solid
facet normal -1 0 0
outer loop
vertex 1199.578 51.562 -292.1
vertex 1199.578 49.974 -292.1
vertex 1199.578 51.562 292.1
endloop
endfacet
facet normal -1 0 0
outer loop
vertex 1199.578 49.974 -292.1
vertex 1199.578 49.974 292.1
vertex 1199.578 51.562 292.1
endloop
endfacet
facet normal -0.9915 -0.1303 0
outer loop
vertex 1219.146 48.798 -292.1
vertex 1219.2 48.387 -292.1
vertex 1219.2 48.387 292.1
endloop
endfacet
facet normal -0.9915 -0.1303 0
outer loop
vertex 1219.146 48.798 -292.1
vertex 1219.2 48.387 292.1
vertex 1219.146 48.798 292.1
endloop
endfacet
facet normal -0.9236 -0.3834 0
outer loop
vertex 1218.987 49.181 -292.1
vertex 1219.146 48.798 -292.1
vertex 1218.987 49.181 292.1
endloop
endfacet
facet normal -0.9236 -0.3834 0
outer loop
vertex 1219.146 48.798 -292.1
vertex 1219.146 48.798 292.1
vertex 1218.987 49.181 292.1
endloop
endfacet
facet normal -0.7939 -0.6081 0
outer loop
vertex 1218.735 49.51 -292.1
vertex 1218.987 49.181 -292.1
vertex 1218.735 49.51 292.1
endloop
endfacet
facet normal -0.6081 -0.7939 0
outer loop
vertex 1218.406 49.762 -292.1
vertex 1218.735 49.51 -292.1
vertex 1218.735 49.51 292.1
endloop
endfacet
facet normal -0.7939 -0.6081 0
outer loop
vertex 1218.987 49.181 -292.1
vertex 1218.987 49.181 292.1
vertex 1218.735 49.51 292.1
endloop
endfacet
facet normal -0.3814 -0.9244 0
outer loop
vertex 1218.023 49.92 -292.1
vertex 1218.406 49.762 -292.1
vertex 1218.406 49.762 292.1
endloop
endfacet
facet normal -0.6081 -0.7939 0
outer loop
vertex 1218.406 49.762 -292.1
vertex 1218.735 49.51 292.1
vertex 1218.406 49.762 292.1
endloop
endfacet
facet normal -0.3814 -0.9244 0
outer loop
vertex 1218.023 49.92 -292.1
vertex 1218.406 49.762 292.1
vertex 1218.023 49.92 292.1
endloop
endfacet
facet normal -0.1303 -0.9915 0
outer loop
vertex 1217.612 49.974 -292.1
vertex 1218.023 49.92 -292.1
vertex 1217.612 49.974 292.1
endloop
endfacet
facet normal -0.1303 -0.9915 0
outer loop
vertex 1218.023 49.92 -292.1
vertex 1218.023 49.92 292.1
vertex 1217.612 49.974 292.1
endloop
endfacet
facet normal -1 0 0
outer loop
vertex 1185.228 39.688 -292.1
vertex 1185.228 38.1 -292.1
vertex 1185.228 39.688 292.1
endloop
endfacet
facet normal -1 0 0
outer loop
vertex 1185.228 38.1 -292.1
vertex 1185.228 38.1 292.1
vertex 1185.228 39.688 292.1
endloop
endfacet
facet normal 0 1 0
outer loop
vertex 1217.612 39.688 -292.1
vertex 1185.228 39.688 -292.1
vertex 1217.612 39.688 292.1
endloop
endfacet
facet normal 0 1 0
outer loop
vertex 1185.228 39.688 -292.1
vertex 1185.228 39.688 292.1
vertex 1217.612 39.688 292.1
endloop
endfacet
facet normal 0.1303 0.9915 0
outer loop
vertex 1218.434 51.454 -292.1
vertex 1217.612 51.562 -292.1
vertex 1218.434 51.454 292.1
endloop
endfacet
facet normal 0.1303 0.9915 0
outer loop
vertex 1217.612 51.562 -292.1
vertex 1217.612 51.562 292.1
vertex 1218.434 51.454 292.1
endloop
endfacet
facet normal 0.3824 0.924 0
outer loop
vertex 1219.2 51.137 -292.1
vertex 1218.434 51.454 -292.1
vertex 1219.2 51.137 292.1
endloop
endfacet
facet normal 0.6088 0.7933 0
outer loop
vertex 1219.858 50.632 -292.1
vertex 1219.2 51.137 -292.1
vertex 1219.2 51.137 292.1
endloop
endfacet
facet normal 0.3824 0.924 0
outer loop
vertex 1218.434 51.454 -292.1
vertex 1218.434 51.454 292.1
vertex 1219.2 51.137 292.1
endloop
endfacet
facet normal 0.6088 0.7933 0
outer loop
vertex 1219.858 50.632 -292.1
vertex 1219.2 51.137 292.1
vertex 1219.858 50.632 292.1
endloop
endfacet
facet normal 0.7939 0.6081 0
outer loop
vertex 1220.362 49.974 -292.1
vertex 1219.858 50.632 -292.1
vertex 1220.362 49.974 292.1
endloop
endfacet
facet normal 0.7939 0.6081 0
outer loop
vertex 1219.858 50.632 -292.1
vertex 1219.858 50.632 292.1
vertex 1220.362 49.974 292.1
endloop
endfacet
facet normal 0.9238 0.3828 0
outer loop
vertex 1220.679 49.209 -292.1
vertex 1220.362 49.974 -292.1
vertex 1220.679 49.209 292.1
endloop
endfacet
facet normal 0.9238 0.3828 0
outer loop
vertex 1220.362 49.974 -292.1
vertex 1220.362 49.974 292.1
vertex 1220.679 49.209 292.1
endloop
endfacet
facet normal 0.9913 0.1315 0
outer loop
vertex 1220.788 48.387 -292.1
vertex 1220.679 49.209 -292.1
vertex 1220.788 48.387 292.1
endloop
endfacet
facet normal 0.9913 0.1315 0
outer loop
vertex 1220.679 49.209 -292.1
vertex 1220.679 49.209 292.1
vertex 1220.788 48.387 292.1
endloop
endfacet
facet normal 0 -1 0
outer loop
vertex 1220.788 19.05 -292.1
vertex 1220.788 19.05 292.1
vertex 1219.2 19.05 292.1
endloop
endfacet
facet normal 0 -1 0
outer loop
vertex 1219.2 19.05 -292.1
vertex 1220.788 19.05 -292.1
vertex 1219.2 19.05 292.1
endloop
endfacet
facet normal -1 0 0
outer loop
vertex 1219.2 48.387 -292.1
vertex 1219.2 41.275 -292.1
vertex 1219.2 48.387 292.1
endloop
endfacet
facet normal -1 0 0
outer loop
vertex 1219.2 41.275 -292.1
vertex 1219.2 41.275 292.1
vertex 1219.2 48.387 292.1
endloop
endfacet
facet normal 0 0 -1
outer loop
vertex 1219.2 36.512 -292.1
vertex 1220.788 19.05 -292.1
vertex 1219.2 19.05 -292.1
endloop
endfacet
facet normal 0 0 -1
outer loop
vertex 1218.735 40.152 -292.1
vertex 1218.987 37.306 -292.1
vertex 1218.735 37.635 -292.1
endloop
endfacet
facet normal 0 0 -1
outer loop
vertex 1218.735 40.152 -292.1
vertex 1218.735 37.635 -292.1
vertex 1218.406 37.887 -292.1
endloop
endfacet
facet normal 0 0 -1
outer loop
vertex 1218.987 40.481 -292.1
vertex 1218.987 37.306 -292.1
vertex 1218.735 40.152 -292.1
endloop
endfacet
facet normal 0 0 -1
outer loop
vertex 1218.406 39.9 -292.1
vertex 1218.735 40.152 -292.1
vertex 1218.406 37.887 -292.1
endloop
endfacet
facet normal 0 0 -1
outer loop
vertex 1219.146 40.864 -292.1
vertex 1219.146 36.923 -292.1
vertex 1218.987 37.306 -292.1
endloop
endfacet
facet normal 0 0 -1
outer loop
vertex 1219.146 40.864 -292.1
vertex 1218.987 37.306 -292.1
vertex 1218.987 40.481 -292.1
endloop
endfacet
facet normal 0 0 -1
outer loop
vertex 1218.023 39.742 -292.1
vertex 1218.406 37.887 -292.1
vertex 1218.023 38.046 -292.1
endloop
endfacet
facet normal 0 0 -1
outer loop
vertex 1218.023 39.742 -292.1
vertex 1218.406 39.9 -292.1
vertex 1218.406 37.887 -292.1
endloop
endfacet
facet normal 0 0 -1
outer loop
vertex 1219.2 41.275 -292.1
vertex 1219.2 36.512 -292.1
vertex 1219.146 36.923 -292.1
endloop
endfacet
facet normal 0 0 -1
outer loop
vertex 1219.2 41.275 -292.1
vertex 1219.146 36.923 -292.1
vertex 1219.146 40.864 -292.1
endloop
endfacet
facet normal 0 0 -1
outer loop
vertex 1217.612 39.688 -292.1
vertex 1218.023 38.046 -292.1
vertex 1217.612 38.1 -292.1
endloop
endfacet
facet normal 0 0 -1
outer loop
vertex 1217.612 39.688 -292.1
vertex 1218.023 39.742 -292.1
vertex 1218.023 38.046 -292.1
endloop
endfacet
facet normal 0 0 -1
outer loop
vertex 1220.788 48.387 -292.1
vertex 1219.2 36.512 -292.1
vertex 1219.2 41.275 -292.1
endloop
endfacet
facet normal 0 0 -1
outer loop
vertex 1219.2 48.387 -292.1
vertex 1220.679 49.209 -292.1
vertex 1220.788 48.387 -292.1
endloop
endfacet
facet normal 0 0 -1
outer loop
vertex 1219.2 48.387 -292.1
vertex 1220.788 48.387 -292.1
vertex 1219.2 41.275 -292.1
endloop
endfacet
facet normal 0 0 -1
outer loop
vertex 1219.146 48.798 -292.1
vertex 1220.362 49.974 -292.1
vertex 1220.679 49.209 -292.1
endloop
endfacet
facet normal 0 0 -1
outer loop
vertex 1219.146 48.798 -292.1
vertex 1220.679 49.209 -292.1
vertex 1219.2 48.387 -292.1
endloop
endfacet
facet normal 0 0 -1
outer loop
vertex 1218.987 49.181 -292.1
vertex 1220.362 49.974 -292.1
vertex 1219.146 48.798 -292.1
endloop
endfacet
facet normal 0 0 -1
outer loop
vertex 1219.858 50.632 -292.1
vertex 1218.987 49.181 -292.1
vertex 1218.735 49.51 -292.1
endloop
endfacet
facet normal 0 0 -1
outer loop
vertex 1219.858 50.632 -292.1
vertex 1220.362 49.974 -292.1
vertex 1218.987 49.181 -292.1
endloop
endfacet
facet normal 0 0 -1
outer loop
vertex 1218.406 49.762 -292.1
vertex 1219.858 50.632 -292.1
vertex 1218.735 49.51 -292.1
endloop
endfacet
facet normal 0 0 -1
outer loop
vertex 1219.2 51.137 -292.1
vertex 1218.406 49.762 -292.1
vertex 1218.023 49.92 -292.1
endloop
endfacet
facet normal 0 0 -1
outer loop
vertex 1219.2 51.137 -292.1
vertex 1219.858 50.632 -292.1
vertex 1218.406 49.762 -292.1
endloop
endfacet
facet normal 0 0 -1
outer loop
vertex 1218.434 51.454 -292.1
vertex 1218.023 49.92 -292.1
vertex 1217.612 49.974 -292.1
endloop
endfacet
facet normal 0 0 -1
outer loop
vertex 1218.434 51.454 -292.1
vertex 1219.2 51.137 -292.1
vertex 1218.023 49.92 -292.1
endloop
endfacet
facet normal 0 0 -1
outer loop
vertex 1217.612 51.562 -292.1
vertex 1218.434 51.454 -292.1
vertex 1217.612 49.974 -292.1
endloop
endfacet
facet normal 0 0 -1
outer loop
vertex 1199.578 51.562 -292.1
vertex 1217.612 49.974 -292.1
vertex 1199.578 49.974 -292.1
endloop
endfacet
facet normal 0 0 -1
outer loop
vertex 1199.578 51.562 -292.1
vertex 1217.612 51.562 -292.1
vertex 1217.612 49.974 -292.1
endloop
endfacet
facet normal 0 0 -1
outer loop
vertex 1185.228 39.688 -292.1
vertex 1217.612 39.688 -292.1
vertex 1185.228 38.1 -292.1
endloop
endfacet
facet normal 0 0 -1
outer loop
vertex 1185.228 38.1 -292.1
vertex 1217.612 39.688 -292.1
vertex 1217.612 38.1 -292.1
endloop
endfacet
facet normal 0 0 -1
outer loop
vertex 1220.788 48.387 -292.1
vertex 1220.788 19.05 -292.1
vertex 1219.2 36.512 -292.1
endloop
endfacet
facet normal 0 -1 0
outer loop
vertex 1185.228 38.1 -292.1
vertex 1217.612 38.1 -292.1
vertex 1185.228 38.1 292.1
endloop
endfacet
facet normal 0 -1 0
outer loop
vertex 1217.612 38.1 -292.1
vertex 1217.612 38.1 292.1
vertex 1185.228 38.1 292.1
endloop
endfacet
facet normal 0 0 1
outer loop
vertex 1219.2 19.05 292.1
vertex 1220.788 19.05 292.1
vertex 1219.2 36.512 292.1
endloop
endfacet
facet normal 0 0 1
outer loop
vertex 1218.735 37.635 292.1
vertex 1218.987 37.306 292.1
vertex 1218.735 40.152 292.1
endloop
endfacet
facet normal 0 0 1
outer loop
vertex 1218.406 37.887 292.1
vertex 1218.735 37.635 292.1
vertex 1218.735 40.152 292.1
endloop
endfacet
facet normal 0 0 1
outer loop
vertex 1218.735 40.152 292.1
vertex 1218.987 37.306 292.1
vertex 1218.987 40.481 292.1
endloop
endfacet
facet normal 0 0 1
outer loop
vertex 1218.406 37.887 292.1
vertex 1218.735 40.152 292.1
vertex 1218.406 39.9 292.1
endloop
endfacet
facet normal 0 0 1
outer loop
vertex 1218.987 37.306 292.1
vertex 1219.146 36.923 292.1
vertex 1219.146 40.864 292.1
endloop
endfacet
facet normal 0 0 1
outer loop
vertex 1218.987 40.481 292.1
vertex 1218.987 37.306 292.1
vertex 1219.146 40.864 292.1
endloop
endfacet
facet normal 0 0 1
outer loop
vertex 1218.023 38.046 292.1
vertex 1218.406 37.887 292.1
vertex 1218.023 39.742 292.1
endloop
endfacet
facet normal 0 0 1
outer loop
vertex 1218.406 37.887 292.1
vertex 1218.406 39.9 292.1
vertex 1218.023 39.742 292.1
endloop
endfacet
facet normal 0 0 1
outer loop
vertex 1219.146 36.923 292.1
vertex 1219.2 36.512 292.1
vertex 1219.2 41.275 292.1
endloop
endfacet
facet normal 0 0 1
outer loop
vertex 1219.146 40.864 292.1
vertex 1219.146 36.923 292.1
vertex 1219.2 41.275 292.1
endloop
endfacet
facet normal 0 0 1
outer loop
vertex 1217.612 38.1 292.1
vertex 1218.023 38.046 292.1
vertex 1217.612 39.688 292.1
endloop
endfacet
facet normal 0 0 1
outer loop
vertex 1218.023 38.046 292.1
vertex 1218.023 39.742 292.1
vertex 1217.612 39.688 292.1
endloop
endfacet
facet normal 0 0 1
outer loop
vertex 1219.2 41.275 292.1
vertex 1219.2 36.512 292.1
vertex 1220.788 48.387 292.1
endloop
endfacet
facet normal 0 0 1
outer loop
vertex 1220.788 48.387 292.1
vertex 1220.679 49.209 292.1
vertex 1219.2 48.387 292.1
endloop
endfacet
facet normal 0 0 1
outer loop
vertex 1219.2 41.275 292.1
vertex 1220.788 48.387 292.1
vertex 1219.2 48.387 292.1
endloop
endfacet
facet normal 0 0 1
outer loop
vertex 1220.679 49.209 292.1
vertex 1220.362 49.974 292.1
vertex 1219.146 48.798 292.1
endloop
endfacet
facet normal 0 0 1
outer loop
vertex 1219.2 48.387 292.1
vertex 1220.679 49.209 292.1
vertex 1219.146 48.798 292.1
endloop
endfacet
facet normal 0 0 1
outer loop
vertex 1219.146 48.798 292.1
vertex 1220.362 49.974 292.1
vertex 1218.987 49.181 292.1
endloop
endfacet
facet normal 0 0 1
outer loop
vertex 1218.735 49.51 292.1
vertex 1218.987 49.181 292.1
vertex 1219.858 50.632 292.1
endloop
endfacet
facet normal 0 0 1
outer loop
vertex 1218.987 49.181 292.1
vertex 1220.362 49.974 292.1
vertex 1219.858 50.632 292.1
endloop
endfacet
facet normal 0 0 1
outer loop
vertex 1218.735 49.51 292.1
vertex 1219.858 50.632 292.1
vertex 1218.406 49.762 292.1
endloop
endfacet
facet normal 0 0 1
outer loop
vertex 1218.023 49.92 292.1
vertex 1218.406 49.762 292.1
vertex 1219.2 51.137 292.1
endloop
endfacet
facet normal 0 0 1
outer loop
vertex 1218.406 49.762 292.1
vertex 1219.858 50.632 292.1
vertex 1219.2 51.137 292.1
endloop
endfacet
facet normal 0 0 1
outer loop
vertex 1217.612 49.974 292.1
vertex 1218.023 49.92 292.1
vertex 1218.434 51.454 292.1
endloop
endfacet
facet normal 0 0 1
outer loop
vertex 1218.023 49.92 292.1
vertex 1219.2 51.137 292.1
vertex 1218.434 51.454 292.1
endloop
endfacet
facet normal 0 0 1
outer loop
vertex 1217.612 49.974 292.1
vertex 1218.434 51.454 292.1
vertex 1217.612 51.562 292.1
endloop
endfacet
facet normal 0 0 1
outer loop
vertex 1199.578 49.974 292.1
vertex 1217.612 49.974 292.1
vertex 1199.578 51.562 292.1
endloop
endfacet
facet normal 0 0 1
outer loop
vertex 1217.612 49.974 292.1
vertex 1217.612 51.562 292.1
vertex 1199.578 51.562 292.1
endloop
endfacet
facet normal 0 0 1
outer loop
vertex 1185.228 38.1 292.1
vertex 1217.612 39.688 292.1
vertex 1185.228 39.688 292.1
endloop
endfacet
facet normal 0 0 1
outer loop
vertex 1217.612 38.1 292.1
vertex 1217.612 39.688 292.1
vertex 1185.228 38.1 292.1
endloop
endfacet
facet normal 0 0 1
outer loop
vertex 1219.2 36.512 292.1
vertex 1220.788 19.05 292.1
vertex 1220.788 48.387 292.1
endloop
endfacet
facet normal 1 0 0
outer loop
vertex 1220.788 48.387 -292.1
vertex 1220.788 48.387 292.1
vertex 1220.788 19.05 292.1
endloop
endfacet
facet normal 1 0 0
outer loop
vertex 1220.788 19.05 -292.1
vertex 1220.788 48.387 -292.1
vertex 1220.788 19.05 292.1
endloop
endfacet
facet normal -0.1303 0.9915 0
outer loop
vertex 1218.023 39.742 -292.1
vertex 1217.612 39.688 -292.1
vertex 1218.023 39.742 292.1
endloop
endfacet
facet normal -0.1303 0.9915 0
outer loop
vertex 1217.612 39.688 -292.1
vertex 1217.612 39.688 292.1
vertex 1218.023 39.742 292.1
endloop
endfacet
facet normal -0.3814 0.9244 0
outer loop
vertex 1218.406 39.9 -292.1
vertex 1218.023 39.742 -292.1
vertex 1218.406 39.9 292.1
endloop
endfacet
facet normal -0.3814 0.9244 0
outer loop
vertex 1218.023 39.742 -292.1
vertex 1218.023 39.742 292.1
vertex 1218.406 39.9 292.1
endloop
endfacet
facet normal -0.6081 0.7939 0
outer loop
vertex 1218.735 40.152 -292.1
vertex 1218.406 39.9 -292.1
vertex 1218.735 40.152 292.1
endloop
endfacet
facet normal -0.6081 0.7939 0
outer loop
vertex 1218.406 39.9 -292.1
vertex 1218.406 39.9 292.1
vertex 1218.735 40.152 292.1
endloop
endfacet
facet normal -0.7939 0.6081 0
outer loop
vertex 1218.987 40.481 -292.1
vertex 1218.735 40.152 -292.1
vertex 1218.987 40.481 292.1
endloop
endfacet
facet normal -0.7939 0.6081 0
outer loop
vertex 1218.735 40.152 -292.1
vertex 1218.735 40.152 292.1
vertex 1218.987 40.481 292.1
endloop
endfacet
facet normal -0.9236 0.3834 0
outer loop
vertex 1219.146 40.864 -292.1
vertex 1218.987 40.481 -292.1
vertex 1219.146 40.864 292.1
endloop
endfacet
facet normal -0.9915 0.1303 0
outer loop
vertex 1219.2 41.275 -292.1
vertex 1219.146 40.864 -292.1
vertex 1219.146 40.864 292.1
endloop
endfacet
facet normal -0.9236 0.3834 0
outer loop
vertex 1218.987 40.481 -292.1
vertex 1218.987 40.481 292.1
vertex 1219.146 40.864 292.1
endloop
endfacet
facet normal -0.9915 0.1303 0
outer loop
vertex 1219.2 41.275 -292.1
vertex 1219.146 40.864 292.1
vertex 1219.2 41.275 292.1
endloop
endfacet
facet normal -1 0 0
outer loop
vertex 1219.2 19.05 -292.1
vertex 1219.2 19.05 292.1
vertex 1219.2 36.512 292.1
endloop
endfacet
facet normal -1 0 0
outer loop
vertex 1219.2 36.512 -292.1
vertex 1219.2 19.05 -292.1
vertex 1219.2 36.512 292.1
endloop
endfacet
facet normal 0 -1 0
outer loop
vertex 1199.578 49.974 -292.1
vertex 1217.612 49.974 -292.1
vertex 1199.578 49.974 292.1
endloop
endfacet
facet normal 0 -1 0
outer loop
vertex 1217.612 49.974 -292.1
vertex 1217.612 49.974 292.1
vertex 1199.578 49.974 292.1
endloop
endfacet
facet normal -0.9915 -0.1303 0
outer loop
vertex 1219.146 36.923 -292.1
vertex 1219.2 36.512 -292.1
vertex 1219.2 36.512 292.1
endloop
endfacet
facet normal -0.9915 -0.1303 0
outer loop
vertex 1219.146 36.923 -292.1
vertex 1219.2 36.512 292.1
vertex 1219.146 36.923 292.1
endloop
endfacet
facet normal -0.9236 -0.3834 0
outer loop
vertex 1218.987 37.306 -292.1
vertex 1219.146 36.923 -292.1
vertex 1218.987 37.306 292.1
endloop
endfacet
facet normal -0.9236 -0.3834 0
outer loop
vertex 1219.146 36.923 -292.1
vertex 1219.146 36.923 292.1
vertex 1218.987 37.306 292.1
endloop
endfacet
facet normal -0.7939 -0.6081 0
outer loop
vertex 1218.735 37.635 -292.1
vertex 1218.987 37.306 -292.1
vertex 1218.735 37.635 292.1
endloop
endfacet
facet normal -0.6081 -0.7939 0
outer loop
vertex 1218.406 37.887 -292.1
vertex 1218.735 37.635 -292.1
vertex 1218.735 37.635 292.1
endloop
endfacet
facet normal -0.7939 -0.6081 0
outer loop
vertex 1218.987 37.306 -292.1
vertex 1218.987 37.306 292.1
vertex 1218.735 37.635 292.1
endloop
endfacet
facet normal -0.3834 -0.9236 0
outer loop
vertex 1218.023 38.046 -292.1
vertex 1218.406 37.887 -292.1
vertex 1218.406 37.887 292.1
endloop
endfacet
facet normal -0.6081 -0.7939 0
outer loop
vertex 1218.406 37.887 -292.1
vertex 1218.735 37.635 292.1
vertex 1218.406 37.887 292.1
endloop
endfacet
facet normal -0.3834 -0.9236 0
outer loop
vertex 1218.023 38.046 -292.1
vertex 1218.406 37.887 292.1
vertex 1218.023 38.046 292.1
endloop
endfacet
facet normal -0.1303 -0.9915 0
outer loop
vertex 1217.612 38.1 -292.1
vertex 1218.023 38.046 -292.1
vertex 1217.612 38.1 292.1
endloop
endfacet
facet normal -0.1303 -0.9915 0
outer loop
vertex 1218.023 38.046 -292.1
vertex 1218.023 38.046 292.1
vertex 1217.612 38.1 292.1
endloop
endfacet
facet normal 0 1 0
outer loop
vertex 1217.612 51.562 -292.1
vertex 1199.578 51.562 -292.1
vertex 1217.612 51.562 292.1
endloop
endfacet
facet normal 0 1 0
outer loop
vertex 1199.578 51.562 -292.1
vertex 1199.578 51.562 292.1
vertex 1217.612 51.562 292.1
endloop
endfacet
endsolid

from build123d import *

# Parameters (mm, degrees)
EXTRUDE1_DEPTH = 292.1


with BuildPart() as part:
    # Sketch1 → Extrude1 (new body, symmetric)
    with BuildSketch(Plane.XY):
        with BuildLine():
            Line((1219.2, 19.05), (1219.2, 36.5125))
            ThreePointArc((1219.2, 36.5125), (1218.735032015, 37.635032015), (1217.6125, 38.1))
            Line((1217.6125, 38.1), (1185.2275, 38.1))
            Line((1185.2275, 38.1), (1185.2275, 39.6875))
            Line((1185.2275, 39.6875), (1217.6125, 39.6875))
            ThreePointArc((1217.6125, 39.6875), (1218.735032015, 40.152467985), (1219.2, 41.275))
            Line((1219.2, 41.275), (1219.2, 48.387))
            ThreePointArc((1219.2, 48.387), (1218.735032015, 49.509532015), (1217.6125, 49.9745))
            Line((1217.6125, 49.9745), (1199.5785, 49.9745))
            Line((1199.5785, 49.9745), (1199.5785, 51.562))
            Line((1199.5785, 51.562), (1217.6125, 51.562))
            ThreePointArc((1217.6125, 51.562), (1219.85756403, 50.63206403), (1220.7875, 48.387))
            Line((1220.7875, 48.387), (1220.7875, 19.05))
            Line((1220.7875, 19.05), (1219.2, 19.05))
        make_face()
    extrude(amount=EXTRUDE1_DEPTH, both=True)


solid = part.part
